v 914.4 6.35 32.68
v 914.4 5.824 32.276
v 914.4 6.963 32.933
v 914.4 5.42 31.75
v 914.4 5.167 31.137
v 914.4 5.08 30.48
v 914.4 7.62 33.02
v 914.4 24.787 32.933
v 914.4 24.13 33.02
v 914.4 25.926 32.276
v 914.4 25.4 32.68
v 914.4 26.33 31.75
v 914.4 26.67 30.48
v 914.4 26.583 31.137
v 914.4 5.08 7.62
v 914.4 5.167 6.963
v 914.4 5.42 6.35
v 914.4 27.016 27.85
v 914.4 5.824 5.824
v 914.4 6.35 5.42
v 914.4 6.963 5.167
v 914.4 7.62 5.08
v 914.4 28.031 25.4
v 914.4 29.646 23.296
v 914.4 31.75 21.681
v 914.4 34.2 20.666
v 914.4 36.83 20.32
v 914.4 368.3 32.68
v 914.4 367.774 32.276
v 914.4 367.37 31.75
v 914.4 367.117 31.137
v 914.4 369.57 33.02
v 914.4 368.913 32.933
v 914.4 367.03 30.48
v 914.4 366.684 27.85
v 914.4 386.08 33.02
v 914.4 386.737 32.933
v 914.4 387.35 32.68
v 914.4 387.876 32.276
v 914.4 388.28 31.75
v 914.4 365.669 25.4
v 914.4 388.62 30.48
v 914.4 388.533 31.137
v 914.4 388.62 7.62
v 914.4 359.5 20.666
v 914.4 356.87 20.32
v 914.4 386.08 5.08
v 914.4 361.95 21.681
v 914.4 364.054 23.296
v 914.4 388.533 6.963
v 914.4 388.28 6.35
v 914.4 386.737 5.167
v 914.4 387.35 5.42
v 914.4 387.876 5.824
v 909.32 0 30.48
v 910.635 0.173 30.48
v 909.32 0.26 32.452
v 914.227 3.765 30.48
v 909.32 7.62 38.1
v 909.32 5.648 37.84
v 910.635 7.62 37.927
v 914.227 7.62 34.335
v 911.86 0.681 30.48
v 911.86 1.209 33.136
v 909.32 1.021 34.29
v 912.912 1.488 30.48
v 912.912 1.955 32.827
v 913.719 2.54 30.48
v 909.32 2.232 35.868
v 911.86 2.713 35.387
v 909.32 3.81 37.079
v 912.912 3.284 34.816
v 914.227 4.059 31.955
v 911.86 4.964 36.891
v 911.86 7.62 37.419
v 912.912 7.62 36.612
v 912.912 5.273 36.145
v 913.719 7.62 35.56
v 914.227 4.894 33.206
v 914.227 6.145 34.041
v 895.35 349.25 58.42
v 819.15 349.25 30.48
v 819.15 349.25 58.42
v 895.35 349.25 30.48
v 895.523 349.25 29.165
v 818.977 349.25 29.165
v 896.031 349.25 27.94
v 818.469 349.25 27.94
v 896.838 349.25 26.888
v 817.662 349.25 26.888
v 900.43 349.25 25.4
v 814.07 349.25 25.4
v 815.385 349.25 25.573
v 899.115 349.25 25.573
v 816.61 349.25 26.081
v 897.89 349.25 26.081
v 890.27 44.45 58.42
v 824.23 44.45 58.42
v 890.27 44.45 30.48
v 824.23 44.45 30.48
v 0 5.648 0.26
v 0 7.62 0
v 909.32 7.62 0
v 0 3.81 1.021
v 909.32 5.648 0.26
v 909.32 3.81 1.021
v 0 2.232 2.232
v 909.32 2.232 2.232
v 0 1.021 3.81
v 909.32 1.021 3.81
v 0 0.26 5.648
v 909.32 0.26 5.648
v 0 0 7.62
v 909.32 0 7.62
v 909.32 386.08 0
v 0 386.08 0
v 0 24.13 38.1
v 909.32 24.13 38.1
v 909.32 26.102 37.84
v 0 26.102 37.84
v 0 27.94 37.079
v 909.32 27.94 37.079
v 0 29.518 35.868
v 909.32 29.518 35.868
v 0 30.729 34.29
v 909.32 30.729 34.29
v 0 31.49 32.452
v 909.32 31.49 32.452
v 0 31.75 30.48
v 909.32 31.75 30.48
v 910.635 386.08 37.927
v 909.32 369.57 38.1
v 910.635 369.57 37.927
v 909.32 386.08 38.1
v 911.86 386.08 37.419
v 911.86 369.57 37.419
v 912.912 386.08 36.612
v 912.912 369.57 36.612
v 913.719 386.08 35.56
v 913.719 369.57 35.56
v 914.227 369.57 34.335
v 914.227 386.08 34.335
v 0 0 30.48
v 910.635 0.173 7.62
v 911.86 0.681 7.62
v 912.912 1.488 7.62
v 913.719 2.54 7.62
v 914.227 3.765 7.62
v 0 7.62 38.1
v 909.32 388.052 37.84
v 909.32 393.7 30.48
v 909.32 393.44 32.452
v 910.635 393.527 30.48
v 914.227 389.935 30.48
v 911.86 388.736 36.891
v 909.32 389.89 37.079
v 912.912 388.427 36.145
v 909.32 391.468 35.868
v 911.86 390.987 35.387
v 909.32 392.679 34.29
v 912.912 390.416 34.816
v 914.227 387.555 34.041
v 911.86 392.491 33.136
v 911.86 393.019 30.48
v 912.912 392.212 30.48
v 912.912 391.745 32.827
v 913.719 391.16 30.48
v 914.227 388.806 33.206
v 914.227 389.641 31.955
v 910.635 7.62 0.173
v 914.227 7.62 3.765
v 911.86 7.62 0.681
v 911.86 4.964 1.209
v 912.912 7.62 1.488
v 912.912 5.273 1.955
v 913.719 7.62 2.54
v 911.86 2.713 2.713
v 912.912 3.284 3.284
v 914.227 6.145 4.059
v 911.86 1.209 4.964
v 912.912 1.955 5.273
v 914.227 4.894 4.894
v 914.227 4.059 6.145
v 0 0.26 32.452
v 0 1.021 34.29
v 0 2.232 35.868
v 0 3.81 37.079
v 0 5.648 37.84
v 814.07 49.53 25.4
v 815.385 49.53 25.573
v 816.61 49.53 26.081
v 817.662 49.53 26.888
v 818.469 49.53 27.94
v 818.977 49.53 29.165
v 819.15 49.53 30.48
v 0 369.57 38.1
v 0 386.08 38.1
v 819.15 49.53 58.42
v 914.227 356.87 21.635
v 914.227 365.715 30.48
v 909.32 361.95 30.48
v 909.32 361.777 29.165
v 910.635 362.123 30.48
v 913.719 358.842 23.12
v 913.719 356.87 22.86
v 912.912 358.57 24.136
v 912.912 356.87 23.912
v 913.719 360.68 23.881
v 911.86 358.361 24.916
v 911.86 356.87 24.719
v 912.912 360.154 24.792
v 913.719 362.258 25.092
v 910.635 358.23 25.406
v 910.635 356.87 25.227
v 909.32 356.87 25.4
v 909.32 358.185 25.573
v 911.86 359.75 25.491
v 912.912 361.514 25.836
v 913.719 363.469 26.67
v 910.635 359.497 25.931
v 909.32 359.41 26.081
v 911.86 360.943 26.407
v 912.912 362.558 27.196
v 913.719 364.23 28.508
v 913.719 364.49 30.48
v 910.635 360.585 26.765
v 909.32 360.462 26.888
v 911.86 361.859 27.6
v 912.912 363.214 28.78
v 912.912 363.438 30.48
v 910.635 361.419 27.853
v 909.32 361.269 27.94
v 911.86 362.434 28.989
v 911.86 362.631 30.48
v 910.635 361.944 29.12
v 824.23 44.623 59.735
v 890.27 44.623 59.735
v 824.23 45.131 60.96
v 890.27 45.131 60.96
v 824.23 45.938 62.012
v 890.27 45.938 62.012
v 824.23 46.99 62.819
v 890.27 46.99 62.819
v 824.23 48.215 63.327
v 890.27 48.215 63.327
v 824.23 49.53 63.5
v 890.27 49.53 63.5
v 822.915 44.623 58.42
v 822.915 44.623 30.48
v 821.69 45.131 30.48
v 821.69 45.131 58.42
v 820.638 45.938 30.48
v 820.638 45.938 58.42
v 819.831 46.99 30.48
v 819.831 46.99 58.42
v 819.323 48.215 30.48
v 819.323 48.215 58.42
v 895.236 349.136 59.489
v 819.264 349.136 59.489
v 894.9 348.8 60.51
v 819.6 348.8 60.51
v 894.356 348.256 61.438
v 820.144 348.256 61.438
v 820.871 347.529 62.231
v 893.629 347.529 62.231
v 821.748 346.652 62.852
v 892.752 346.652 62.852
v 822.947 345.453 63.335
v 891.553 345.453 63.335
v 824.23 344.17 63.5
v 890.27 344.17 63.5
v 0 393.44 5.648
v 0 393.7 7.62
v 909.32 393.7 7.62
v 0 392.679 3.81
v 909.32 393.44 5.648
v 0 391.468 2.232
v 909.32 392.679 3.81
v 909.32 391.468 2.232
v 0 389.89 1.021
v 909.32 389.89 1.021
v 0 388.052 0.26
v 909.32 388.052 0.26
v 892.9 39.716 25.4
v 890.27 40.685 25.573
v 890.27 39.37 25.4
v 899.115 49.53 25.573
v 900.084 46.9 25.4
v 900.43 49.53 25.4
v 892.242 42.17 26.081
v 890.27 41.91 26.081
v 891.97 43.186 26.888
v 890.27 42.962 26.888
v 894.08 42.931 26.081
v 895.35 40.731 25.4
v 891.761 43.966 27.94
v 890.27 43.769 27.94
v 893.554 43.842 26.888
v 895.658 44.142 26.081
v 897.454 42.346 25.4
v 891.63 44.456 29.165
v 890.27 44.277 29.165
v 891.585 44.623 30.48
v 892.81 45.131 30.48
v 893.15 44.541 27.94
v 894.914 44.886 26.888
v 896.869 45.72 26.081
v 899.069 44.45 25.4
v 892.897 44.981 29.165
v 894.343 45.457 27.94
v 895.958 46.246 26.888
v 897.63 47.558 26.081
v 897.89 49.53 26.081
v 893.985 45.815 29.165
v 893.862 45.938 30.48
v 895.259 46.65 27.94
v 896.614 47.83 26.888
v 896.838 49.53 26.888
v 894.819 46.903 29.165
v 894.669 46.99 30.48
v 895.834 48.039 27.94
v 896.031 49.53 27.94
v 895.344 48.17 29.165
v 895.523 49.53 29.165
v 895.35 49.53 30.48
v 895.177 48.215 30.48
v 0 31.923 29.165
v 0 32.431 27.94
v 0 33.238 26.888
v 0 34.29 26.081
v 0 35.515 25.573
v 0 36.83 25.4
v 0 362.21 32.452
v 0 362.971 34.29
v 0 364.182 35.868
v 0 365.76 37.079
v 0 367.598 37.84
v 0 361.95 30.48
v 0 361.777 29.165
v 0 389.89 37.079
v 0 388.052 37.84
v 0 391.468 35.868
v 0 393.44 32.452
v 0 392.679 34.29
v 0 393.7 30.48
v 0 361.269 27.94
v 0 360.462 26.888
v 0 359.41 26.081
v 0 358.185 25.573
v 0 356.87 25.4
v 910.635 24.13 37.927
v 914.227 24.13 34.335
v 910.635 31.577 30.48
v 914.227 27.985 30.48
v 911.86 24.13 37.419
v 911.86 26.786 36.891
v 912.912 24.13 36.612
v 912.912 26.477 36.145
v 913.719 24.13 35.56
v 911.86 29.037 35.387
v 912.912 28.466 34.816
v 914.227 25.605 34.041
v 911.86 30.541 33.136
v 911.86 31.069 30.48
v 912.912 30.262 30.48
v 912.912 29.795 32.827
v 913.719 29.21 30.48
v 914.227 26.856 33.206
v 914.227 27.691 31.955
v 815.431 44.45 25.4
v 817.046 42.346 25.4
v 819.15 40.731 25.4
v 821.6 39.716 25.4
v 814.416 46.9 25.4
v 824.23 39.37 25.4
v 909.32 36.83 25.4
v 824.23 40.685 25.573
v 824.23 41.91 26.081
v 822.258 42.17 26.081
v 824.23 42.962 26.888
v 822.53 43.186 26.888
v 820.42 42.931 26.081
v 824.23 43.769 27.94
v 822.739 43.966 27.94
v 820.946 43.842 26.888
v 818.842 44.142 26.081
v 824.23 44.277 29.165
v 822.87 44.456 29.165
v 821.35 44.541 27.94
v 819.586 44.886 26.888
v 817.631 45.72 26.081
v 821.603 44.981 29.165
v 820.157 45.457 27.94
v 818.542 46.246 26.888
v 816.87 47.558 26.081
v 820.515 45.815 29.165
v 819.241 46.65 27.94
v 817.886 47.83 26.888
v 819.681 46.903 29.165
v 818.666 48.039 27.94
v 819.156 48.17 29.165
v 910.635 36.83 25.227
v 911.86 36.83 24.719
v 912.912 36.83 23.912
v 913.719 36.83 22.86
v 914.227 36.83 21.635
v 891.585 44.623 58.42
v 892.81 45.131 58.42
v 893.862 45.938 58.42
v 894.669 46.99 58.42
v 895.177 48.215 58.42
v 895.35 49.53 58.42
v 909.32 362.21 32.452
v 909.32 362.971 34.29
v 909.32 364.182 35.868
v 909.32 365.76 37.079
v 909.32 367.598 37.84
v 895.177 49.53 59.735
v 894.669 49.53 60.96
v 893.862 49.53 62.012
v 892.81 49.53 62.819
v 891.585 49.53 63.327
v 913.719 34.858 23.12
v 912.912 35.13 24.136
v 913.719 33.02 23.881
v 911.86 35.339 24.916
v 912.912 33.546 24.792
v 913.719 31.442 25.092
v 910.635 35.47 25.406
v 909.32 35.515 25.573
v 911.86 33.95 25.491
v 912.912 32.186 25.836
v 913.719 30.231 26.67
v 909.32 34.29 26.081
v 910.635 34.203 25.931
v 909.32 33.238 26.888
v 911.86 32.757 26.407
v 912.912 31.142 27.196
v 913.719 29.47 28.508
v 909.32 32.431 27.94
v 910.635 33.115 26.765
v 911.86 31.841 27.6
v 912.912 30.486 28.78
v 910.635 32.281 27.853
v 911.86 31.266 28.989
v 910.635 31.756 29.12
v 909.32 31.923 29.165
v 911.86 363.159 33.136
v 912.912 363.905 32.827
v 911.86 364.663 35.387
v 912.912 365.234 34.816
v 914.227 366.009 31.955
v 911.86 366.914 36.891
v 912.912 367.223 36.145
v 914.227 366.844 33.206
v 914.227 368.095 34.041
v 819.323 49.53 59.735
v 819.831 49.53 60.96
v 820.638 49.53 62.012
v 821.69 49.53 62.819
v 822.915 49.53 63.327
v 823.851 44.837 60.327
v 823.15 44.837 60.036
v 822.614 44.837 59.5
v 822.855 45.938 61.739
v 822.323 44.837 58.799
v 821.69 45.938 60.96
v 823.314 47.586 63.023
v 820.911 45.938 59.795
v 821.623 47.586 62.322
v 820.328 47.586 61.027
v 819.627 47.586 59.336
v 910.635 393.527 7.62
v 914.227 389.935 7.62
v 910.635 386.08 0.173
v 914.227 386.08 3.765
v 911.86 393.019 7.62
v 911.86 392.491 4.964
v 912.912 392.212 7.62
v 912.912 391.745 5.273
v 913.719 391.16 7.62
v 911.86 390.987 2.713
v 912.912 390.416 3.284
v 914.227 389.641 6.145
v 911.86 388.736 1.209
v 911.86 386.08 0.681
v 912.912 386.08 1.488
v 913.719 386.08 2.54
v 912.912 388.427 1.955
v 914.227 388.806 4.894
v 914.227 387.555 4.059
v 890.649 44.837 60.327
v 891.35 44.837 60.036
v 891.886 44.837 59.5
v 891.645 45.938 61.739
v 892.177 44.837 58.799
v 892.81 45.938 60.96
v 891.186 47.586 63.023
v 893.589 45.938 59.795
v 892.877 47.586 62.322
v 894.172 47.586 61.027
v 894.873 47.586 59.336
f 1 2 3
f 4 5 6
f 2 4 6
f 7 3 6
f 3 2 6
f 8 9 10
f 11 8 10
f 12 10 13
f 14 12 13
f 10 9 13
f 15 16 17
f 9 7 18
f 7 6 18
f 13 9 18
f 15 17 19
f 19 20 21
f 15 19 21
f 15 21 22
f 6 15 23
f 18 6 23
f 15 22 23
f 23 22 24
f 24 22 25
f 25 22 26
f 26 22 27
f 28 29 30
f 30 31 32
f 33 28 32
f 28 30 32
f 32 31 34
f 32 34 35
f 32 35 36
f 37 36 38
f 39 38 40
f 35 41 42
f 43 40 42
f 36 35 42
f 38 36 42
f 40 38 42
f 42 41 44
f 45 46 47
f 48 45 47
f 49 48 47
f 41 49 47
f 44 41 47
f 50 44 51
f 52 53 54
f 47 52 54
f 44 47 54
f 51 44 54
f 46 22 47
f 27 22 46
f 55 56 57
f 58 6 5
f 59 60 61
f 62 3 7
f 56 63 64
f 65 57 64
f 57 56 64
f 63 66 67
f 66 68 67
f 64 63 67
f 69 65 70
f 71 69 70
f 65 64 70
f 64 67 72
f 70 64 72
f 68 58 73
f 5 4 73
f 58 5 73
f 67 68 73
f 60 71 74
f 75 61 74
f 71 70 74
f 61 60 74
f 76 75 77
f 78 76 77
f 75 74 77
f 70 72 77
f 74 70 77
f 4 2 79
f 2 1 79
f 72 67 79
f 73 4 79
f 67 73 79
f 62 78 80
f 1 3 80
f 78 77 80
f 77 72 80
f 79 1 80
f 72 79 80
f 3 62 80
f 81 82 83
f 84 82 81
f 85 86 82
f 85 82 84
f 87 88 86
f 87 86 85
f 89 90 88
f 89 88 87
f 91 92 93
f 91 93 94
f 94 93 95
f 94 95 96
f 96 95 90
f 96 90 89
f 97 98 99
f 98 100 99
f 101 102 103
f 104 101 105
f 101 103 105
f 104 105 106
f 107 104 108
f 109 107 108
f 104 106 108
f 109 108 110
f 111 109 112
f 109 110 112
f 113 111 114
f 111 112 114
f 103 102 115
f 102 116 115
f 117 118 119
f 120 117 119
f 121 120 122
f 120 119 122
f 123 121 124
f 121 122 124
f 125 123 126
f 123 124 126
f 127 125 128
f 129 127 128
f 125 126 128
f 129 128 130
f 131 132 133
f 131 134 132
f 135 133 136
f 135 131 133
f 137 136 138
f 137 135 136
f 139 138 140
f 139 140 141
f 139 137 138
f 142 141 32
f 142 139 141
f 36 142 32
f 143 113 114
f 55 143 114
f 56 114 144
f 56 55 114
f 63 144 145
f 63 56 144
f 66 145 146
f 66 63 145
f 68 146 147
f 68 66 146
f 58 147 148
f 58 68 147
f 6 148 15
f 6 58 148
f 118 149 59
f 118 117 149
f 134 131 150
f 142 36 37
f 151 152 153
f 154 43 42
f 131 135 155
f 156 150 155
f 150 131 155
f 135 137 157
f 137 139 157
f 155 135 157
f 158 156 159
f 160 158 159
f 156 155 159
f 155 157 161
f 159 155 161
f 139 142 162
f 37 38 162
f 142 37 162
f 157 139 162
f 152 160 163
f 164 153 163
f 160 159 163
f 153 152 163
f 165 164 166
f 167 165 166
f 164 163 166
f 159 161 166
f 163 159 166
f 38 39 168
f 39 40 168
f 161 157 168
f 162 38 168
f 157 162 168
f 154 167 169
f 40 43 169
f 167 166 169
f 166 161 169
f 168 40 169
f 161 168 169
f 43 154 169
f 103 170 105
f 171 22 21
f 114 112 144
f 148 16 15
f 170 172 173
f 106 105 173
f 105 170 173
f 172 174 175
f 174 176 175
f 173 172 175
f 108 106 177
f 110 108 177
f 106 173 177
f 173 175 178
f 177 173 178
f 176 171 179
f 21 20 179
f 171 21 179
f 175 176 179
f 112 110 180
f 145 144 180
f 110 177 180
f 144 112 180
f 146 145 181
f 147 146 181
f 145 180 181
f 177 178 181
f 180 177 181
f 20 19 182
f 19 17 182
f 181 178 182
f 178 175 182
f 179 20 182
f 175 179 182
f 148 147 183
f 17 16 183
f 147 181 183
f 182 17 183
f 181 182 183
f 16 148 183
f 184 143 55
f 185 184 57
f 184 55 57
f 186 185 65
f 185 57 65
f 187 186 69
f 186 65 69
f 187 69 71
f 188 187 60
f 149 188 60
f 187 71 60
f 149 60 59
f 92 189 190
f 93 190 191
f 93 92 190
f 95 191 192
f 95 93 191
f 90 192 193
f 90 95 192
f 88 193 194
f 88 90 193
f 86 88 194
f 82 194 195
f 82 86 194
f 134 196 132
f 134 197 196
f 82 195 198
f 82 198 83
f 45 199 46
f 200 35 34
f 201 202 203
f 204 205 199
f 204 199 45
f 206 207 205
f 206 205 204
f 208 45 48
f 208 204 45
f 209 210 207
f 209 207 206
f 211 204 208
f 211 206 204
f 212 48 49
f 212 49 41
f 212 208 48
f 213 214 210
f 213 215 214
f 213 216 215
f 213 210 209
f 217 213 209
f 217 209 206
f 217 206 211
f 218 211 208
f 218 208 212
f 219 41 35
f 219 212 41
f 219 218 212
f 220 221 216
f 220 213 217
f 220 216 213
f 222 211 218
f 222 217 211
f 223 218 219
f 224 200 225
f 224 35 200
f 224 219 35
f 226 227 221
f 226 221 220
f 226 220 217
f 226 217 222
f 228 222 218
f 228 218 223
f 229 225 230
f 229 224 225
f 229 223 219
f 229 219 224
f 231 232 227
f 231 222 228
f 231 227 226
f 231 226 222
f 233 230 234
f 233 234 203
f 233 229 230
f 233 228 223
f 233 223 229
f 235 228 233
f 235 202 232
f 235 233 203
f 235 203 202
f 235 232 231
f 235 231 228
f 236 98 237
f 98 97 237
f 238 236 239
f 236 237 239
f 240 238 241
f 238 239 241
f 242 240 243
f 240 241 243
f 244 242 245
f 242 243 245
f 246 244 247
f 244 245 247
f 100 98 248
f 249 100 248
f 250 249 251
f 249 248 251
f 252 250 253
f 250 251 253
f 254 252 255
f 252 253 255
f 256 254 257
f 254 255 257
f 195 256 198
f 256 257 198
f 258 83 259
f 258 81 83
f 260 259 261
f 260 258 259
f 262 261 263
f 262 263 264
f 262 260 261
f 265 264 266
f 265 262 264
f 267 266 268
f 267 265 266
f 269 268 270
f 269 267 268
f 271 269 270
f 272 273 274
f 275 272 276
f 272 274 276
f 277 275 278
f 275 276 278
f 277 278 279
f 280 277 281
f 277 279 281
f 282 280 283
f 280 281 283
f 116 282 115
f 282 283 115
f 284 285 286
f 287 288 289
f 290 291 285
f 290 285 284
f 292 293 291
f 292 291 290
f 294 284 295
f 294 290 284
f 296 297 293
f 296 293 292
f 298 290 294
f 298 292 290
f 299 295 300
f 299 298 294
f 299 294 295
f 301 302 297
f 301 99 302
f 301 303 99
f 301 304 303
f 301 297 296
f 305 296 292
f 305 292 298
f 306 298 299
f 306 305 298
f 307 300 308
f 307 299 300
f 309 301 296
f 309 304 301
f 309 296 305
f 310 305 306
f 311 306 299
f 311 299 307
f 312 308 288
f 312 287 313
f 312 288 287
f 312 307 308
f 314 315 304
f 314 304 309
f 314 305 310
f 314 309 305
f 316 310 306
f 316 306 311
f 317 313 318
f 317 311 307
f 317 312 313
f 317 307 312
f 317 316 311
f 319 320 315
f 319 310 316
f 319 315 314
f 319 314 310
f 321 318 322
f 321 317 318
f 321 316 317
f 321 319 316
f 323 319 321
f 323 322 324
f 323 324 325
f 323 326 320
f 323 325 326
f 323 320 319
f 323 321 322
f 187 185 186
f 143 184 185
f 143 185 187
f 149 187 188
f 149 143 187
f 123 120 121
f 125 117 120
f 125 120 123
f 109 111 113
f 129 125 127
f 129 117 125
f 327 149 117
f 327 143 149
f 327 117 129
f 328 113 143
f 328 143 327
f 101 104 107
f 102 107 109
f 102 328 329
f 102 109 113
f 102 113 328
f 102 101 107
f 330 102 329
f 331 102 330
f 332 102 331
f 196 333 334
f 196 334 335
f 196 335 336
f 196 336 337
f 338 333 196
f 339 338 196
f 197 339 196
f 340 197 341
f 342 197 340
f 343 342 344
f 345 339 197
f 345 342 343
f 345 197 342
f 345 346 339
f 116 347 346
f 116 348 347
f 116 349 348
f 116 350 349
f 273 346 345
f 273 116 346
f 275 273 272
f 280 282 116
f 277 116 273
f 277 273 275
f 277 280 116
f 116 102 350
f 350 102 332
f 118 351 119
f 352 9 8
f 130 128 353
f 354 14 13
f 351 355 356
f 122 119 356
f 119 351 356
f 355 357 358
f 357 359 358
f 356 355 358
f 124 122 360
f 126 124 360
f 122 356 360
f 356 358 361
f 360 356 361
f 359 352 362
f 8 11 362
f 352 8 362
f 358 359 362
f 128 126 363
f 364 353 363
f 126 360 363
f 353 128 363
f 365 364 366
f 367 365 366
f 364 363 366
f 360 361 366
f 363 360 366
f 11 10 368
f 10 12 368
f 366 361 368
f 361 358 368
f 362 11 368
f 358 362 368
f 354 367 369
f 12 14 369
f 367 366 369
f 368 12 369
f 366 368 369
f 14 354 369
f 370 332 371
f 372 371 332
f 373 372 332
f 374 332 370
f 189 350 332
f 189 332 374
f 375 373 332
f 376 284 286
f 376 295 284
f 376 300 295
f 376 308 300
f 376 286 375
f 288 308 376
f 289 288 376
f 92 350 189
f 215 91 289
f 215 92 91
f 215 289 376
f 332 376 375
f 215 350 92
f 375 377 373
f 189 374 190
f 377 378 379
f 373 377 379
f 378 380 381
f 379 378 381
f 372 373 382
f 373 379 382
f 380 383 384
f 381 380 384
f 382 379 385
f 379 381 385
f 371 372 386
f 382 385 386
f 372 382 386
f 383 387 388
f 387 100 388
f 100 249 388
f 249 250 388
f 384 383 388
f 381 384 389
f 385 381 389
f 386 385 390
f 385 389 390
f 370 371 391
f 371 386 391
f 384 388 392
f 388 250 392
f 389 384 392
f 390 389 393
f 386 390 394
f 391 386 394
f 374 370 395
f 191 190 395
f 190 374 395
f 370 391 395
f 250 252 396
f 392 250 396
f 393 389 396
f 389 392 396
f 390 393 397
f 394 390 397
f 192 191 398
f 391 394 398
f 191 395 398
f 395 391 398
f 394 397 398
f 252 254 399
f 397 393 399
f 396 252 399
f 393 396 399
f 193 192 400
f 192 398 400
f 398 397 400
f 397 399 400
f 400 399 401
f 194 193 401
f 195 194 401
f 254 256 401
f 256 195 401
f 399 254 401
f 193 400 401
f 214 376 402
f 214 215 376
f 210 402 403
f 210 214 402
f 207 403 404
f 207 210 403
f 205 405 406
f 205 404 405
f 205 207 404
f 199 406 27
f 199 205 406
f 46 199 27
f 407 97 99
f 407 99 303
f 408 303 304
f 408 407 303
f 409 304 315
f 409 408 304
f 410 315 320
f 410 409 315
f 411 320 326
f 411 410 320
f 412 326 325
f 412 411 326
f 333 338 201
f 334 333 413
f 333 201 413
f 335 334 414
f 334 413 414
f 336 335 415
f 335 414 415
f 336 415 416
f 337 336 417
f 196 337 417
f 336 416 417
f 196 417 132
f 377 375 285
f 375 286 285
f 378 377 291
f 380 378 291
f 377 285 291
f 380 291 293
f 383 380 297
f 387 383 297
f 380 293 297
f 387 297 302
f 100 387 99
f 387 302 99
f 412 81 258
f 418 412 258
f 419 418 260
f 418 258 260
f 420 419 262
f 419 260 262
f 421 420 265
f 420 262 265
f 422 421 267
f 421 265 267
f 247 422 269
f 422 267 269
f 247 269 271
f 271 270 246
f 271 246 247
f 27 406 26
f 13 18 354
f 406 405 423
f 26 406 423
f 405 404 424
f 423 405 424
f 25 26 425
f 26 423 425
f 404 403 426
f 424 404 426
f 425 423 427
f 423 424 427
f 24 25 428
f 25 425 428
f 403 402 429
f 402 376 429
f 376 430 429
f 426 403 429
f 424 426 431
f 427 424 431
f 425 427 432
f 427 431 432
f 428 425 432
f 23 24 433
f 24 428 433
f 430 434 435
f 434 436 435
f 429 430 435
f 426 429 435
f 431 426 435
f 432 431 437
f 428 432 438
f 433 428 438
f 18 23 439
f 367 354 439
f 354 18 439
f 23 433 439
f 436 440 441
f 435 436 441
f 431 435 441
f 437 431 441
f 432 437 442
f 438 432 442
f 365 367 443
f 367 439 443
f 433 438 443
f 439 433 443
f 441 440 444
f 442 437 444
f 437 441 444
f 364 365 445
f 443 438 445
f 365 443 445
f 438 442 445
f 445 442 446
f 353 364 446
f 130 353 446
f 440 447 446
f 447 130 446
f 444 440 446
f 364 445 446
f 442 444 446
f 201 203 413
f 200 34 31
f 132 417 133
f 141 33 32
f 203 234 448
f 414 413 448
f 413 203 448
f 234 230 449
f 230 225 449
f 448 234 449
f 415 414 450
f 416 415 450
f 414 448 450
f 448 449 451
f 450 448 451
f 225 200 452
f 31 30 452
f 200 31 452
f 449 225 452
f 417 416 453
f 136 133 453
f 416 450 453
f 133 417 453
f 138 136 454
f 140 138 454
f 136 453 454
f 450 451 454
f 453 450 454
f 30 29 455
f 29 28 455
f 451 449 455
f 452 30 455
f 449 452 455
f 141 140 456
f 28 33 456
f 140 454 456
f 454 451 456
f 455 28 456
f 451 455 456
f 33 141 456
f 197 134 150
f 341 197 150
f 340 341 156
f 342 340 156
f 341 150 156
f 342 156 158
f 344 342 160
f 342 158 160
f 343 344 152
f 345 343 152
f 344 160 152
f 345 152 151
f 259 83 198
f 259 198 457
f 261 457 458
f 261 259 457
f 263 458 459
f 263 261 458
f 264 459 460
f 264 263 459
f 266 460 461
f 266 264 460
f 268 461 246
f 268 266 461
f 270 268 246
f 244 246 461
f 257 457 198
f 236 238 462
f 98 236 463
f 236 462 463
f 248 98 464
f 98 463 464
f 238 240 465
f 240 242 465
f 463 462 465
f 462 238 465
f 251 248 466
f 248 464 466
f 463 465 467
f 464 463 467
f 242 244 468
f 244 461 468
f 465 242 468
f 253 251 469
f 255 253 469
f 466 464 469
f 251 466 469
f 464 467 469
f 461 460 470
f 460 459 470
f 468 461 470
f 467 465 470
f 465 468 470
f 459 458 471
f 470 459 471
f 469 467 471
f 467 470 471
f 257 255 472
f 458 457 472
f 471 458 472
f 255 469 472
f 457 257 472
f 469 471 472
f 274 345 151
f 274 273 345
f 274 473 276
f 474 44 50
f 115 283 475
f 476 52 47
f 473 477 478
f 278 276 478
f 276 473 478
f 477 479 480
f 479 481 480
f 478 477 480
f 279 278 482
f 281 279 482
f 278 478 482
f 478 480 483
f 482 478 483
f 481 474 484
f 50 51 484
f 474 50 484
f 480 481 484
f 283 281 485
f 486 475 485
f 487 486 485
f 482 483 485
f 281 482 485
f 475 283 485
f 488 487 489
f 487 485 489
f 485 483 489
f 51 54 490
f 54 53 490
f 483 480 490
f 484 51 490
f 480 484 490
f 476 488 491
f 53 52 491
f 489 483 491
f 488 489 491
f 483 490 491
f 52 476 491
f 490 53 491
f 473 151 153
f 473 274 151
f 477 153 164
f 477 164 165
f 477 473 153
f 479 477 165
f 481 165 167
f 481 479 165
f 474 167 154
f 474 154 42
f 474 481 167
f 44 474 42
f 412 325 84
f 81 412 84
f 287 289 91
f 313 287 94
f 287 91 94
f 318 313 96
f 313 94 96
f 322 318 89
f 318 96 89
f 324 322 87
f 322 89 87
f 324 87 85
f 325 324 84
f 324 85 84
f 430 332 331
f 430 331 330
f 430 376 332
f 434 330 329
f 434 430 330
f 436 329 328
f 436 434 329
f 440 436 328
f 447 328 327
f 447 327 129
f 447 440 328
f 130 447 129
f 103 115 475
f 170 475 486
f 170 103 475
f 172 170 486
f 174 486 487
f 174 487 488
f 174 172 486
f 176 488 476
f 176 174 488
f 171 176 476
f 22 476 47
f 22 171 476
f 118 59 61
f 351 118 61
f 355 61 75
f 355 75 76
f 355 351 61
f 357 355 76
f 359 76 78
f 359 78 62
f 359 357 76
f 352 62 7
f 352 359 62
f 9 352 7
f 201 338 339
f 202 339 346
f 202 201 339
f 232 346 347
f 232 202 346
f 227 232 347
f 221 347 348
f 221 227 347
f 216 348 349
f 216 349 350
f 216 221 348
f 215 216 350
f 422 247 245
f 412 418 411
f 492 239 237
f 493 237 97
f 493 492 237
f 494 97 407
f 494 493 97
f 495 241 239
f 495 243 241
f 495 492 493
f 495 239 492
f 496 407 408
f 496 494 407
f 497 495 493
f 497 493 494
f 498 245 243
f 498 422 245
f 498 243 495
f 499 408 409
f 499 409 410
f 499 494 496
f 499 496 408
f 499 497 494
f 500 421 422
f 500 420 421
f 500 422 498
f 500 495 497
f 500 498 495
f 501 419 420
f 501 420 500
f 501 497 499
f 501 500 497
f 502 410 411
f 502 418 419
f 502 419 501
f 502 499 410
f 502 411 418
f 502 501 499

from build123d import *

# Parameters (mm, degrees)
F0_W     = 914.4
F0_H     = 393.7
F1_DEPTH = 25.4
F2_W     = 914.4
F2_H     = 31.75
F3_DEPTH = 12.7
F4_W     = 76.2
F4_H     = 304.8
F5_DEPTH = 38.1
F6_R     = 7.62
F7_R     = 5.07999


# Not quite as in the source:
# - a fillet or chamfer is up to 0.001 mm smaller than in the source, because OpenCascade refuses the exact size


with BuildPart() as f1:
    # F0 (on Top) → F1 (new body)
    with BuildSketch(Plane.XY):
        with Locations((457.2, 196.85)):
            Rectangle(F0_W, F0_H)
    extrude(amount=F1_DEPTH)

    # F2 (on face) → F3 (join)
    with BuildSketch(Plane.XY.offset(25.4)):
        with Locations((457.2, 377.825)):
            Rectangle(F2_W, F2_H)
        with Locations((457.2, 15.875)):
            Rectangle(F2_W, F2_H)
    extrude(amount=F3_DEPTH)

    # F4 (on face) → F5 (join)
    with BuildSketch(Plane.XY.offset(25.4)):
        with Locations((857.25, 196.85)):
            Rectangle(F4_W, F4_H)
    extrude(amount=F5_DEPTH)

    # F6
    f6_edges = [f1.edges().sort_by_distance(p)[0] for p in [
        (457.2, 393.7, 38.1),
        (457.2, 361.95, 38.1),
        (457.2, 31.75, 38.1),
        (457.2, 0, 38.1),
        (457.2, 393.7, 0),
        (457.2, 0, 0),
    ]]
    fillet(f6_edges, radius=F6_R)

    # F7 (radius 5.08 in the source; OpenCascade refuses exactly that, so slightly less here)
    f7_edges = [f1.edges().sort_by_distance(p)[0] for p in [
        (895.35, 196.85, 63.5),
        (857.25, 349.25, 63.5),
        (819.15, 196.85, 63.5),
        (857.25, 44.45, 63.5),
        (819.15, 44.45, 44.45),
        (895.35, 44.45, 44.45),
        (857.25, 44.45, 25.4),
        (457.2, 31.75, 25.4),
        (457.2, 361.95, 25.4),
        (914.4, 196.85, 25.4),
        (914.4, 393.7, 19.05),
        (914.4, 391.468154, 35.868154),
        (914.4, 391.468154, 2.231846),
        (914.4, 377.825, 38.1),
        (914.4, 196.85, 0),
        (914.4, 364.181846, 35.868154),
        (914.4, 2.231846, 2.231846),
        (914.4, 0, 19.05),
        (895.35, 196.85, 25.4),
        (819.15, 196.85, 25.4),
        (914.4, 2.231846, 35.868154),
        (914.4, 15.875, 38.1),
        (914.4, 29.518154, 35.868154),
    ]]
    fillet(f7_edges, radius=F7_R)


solid = f1.part
